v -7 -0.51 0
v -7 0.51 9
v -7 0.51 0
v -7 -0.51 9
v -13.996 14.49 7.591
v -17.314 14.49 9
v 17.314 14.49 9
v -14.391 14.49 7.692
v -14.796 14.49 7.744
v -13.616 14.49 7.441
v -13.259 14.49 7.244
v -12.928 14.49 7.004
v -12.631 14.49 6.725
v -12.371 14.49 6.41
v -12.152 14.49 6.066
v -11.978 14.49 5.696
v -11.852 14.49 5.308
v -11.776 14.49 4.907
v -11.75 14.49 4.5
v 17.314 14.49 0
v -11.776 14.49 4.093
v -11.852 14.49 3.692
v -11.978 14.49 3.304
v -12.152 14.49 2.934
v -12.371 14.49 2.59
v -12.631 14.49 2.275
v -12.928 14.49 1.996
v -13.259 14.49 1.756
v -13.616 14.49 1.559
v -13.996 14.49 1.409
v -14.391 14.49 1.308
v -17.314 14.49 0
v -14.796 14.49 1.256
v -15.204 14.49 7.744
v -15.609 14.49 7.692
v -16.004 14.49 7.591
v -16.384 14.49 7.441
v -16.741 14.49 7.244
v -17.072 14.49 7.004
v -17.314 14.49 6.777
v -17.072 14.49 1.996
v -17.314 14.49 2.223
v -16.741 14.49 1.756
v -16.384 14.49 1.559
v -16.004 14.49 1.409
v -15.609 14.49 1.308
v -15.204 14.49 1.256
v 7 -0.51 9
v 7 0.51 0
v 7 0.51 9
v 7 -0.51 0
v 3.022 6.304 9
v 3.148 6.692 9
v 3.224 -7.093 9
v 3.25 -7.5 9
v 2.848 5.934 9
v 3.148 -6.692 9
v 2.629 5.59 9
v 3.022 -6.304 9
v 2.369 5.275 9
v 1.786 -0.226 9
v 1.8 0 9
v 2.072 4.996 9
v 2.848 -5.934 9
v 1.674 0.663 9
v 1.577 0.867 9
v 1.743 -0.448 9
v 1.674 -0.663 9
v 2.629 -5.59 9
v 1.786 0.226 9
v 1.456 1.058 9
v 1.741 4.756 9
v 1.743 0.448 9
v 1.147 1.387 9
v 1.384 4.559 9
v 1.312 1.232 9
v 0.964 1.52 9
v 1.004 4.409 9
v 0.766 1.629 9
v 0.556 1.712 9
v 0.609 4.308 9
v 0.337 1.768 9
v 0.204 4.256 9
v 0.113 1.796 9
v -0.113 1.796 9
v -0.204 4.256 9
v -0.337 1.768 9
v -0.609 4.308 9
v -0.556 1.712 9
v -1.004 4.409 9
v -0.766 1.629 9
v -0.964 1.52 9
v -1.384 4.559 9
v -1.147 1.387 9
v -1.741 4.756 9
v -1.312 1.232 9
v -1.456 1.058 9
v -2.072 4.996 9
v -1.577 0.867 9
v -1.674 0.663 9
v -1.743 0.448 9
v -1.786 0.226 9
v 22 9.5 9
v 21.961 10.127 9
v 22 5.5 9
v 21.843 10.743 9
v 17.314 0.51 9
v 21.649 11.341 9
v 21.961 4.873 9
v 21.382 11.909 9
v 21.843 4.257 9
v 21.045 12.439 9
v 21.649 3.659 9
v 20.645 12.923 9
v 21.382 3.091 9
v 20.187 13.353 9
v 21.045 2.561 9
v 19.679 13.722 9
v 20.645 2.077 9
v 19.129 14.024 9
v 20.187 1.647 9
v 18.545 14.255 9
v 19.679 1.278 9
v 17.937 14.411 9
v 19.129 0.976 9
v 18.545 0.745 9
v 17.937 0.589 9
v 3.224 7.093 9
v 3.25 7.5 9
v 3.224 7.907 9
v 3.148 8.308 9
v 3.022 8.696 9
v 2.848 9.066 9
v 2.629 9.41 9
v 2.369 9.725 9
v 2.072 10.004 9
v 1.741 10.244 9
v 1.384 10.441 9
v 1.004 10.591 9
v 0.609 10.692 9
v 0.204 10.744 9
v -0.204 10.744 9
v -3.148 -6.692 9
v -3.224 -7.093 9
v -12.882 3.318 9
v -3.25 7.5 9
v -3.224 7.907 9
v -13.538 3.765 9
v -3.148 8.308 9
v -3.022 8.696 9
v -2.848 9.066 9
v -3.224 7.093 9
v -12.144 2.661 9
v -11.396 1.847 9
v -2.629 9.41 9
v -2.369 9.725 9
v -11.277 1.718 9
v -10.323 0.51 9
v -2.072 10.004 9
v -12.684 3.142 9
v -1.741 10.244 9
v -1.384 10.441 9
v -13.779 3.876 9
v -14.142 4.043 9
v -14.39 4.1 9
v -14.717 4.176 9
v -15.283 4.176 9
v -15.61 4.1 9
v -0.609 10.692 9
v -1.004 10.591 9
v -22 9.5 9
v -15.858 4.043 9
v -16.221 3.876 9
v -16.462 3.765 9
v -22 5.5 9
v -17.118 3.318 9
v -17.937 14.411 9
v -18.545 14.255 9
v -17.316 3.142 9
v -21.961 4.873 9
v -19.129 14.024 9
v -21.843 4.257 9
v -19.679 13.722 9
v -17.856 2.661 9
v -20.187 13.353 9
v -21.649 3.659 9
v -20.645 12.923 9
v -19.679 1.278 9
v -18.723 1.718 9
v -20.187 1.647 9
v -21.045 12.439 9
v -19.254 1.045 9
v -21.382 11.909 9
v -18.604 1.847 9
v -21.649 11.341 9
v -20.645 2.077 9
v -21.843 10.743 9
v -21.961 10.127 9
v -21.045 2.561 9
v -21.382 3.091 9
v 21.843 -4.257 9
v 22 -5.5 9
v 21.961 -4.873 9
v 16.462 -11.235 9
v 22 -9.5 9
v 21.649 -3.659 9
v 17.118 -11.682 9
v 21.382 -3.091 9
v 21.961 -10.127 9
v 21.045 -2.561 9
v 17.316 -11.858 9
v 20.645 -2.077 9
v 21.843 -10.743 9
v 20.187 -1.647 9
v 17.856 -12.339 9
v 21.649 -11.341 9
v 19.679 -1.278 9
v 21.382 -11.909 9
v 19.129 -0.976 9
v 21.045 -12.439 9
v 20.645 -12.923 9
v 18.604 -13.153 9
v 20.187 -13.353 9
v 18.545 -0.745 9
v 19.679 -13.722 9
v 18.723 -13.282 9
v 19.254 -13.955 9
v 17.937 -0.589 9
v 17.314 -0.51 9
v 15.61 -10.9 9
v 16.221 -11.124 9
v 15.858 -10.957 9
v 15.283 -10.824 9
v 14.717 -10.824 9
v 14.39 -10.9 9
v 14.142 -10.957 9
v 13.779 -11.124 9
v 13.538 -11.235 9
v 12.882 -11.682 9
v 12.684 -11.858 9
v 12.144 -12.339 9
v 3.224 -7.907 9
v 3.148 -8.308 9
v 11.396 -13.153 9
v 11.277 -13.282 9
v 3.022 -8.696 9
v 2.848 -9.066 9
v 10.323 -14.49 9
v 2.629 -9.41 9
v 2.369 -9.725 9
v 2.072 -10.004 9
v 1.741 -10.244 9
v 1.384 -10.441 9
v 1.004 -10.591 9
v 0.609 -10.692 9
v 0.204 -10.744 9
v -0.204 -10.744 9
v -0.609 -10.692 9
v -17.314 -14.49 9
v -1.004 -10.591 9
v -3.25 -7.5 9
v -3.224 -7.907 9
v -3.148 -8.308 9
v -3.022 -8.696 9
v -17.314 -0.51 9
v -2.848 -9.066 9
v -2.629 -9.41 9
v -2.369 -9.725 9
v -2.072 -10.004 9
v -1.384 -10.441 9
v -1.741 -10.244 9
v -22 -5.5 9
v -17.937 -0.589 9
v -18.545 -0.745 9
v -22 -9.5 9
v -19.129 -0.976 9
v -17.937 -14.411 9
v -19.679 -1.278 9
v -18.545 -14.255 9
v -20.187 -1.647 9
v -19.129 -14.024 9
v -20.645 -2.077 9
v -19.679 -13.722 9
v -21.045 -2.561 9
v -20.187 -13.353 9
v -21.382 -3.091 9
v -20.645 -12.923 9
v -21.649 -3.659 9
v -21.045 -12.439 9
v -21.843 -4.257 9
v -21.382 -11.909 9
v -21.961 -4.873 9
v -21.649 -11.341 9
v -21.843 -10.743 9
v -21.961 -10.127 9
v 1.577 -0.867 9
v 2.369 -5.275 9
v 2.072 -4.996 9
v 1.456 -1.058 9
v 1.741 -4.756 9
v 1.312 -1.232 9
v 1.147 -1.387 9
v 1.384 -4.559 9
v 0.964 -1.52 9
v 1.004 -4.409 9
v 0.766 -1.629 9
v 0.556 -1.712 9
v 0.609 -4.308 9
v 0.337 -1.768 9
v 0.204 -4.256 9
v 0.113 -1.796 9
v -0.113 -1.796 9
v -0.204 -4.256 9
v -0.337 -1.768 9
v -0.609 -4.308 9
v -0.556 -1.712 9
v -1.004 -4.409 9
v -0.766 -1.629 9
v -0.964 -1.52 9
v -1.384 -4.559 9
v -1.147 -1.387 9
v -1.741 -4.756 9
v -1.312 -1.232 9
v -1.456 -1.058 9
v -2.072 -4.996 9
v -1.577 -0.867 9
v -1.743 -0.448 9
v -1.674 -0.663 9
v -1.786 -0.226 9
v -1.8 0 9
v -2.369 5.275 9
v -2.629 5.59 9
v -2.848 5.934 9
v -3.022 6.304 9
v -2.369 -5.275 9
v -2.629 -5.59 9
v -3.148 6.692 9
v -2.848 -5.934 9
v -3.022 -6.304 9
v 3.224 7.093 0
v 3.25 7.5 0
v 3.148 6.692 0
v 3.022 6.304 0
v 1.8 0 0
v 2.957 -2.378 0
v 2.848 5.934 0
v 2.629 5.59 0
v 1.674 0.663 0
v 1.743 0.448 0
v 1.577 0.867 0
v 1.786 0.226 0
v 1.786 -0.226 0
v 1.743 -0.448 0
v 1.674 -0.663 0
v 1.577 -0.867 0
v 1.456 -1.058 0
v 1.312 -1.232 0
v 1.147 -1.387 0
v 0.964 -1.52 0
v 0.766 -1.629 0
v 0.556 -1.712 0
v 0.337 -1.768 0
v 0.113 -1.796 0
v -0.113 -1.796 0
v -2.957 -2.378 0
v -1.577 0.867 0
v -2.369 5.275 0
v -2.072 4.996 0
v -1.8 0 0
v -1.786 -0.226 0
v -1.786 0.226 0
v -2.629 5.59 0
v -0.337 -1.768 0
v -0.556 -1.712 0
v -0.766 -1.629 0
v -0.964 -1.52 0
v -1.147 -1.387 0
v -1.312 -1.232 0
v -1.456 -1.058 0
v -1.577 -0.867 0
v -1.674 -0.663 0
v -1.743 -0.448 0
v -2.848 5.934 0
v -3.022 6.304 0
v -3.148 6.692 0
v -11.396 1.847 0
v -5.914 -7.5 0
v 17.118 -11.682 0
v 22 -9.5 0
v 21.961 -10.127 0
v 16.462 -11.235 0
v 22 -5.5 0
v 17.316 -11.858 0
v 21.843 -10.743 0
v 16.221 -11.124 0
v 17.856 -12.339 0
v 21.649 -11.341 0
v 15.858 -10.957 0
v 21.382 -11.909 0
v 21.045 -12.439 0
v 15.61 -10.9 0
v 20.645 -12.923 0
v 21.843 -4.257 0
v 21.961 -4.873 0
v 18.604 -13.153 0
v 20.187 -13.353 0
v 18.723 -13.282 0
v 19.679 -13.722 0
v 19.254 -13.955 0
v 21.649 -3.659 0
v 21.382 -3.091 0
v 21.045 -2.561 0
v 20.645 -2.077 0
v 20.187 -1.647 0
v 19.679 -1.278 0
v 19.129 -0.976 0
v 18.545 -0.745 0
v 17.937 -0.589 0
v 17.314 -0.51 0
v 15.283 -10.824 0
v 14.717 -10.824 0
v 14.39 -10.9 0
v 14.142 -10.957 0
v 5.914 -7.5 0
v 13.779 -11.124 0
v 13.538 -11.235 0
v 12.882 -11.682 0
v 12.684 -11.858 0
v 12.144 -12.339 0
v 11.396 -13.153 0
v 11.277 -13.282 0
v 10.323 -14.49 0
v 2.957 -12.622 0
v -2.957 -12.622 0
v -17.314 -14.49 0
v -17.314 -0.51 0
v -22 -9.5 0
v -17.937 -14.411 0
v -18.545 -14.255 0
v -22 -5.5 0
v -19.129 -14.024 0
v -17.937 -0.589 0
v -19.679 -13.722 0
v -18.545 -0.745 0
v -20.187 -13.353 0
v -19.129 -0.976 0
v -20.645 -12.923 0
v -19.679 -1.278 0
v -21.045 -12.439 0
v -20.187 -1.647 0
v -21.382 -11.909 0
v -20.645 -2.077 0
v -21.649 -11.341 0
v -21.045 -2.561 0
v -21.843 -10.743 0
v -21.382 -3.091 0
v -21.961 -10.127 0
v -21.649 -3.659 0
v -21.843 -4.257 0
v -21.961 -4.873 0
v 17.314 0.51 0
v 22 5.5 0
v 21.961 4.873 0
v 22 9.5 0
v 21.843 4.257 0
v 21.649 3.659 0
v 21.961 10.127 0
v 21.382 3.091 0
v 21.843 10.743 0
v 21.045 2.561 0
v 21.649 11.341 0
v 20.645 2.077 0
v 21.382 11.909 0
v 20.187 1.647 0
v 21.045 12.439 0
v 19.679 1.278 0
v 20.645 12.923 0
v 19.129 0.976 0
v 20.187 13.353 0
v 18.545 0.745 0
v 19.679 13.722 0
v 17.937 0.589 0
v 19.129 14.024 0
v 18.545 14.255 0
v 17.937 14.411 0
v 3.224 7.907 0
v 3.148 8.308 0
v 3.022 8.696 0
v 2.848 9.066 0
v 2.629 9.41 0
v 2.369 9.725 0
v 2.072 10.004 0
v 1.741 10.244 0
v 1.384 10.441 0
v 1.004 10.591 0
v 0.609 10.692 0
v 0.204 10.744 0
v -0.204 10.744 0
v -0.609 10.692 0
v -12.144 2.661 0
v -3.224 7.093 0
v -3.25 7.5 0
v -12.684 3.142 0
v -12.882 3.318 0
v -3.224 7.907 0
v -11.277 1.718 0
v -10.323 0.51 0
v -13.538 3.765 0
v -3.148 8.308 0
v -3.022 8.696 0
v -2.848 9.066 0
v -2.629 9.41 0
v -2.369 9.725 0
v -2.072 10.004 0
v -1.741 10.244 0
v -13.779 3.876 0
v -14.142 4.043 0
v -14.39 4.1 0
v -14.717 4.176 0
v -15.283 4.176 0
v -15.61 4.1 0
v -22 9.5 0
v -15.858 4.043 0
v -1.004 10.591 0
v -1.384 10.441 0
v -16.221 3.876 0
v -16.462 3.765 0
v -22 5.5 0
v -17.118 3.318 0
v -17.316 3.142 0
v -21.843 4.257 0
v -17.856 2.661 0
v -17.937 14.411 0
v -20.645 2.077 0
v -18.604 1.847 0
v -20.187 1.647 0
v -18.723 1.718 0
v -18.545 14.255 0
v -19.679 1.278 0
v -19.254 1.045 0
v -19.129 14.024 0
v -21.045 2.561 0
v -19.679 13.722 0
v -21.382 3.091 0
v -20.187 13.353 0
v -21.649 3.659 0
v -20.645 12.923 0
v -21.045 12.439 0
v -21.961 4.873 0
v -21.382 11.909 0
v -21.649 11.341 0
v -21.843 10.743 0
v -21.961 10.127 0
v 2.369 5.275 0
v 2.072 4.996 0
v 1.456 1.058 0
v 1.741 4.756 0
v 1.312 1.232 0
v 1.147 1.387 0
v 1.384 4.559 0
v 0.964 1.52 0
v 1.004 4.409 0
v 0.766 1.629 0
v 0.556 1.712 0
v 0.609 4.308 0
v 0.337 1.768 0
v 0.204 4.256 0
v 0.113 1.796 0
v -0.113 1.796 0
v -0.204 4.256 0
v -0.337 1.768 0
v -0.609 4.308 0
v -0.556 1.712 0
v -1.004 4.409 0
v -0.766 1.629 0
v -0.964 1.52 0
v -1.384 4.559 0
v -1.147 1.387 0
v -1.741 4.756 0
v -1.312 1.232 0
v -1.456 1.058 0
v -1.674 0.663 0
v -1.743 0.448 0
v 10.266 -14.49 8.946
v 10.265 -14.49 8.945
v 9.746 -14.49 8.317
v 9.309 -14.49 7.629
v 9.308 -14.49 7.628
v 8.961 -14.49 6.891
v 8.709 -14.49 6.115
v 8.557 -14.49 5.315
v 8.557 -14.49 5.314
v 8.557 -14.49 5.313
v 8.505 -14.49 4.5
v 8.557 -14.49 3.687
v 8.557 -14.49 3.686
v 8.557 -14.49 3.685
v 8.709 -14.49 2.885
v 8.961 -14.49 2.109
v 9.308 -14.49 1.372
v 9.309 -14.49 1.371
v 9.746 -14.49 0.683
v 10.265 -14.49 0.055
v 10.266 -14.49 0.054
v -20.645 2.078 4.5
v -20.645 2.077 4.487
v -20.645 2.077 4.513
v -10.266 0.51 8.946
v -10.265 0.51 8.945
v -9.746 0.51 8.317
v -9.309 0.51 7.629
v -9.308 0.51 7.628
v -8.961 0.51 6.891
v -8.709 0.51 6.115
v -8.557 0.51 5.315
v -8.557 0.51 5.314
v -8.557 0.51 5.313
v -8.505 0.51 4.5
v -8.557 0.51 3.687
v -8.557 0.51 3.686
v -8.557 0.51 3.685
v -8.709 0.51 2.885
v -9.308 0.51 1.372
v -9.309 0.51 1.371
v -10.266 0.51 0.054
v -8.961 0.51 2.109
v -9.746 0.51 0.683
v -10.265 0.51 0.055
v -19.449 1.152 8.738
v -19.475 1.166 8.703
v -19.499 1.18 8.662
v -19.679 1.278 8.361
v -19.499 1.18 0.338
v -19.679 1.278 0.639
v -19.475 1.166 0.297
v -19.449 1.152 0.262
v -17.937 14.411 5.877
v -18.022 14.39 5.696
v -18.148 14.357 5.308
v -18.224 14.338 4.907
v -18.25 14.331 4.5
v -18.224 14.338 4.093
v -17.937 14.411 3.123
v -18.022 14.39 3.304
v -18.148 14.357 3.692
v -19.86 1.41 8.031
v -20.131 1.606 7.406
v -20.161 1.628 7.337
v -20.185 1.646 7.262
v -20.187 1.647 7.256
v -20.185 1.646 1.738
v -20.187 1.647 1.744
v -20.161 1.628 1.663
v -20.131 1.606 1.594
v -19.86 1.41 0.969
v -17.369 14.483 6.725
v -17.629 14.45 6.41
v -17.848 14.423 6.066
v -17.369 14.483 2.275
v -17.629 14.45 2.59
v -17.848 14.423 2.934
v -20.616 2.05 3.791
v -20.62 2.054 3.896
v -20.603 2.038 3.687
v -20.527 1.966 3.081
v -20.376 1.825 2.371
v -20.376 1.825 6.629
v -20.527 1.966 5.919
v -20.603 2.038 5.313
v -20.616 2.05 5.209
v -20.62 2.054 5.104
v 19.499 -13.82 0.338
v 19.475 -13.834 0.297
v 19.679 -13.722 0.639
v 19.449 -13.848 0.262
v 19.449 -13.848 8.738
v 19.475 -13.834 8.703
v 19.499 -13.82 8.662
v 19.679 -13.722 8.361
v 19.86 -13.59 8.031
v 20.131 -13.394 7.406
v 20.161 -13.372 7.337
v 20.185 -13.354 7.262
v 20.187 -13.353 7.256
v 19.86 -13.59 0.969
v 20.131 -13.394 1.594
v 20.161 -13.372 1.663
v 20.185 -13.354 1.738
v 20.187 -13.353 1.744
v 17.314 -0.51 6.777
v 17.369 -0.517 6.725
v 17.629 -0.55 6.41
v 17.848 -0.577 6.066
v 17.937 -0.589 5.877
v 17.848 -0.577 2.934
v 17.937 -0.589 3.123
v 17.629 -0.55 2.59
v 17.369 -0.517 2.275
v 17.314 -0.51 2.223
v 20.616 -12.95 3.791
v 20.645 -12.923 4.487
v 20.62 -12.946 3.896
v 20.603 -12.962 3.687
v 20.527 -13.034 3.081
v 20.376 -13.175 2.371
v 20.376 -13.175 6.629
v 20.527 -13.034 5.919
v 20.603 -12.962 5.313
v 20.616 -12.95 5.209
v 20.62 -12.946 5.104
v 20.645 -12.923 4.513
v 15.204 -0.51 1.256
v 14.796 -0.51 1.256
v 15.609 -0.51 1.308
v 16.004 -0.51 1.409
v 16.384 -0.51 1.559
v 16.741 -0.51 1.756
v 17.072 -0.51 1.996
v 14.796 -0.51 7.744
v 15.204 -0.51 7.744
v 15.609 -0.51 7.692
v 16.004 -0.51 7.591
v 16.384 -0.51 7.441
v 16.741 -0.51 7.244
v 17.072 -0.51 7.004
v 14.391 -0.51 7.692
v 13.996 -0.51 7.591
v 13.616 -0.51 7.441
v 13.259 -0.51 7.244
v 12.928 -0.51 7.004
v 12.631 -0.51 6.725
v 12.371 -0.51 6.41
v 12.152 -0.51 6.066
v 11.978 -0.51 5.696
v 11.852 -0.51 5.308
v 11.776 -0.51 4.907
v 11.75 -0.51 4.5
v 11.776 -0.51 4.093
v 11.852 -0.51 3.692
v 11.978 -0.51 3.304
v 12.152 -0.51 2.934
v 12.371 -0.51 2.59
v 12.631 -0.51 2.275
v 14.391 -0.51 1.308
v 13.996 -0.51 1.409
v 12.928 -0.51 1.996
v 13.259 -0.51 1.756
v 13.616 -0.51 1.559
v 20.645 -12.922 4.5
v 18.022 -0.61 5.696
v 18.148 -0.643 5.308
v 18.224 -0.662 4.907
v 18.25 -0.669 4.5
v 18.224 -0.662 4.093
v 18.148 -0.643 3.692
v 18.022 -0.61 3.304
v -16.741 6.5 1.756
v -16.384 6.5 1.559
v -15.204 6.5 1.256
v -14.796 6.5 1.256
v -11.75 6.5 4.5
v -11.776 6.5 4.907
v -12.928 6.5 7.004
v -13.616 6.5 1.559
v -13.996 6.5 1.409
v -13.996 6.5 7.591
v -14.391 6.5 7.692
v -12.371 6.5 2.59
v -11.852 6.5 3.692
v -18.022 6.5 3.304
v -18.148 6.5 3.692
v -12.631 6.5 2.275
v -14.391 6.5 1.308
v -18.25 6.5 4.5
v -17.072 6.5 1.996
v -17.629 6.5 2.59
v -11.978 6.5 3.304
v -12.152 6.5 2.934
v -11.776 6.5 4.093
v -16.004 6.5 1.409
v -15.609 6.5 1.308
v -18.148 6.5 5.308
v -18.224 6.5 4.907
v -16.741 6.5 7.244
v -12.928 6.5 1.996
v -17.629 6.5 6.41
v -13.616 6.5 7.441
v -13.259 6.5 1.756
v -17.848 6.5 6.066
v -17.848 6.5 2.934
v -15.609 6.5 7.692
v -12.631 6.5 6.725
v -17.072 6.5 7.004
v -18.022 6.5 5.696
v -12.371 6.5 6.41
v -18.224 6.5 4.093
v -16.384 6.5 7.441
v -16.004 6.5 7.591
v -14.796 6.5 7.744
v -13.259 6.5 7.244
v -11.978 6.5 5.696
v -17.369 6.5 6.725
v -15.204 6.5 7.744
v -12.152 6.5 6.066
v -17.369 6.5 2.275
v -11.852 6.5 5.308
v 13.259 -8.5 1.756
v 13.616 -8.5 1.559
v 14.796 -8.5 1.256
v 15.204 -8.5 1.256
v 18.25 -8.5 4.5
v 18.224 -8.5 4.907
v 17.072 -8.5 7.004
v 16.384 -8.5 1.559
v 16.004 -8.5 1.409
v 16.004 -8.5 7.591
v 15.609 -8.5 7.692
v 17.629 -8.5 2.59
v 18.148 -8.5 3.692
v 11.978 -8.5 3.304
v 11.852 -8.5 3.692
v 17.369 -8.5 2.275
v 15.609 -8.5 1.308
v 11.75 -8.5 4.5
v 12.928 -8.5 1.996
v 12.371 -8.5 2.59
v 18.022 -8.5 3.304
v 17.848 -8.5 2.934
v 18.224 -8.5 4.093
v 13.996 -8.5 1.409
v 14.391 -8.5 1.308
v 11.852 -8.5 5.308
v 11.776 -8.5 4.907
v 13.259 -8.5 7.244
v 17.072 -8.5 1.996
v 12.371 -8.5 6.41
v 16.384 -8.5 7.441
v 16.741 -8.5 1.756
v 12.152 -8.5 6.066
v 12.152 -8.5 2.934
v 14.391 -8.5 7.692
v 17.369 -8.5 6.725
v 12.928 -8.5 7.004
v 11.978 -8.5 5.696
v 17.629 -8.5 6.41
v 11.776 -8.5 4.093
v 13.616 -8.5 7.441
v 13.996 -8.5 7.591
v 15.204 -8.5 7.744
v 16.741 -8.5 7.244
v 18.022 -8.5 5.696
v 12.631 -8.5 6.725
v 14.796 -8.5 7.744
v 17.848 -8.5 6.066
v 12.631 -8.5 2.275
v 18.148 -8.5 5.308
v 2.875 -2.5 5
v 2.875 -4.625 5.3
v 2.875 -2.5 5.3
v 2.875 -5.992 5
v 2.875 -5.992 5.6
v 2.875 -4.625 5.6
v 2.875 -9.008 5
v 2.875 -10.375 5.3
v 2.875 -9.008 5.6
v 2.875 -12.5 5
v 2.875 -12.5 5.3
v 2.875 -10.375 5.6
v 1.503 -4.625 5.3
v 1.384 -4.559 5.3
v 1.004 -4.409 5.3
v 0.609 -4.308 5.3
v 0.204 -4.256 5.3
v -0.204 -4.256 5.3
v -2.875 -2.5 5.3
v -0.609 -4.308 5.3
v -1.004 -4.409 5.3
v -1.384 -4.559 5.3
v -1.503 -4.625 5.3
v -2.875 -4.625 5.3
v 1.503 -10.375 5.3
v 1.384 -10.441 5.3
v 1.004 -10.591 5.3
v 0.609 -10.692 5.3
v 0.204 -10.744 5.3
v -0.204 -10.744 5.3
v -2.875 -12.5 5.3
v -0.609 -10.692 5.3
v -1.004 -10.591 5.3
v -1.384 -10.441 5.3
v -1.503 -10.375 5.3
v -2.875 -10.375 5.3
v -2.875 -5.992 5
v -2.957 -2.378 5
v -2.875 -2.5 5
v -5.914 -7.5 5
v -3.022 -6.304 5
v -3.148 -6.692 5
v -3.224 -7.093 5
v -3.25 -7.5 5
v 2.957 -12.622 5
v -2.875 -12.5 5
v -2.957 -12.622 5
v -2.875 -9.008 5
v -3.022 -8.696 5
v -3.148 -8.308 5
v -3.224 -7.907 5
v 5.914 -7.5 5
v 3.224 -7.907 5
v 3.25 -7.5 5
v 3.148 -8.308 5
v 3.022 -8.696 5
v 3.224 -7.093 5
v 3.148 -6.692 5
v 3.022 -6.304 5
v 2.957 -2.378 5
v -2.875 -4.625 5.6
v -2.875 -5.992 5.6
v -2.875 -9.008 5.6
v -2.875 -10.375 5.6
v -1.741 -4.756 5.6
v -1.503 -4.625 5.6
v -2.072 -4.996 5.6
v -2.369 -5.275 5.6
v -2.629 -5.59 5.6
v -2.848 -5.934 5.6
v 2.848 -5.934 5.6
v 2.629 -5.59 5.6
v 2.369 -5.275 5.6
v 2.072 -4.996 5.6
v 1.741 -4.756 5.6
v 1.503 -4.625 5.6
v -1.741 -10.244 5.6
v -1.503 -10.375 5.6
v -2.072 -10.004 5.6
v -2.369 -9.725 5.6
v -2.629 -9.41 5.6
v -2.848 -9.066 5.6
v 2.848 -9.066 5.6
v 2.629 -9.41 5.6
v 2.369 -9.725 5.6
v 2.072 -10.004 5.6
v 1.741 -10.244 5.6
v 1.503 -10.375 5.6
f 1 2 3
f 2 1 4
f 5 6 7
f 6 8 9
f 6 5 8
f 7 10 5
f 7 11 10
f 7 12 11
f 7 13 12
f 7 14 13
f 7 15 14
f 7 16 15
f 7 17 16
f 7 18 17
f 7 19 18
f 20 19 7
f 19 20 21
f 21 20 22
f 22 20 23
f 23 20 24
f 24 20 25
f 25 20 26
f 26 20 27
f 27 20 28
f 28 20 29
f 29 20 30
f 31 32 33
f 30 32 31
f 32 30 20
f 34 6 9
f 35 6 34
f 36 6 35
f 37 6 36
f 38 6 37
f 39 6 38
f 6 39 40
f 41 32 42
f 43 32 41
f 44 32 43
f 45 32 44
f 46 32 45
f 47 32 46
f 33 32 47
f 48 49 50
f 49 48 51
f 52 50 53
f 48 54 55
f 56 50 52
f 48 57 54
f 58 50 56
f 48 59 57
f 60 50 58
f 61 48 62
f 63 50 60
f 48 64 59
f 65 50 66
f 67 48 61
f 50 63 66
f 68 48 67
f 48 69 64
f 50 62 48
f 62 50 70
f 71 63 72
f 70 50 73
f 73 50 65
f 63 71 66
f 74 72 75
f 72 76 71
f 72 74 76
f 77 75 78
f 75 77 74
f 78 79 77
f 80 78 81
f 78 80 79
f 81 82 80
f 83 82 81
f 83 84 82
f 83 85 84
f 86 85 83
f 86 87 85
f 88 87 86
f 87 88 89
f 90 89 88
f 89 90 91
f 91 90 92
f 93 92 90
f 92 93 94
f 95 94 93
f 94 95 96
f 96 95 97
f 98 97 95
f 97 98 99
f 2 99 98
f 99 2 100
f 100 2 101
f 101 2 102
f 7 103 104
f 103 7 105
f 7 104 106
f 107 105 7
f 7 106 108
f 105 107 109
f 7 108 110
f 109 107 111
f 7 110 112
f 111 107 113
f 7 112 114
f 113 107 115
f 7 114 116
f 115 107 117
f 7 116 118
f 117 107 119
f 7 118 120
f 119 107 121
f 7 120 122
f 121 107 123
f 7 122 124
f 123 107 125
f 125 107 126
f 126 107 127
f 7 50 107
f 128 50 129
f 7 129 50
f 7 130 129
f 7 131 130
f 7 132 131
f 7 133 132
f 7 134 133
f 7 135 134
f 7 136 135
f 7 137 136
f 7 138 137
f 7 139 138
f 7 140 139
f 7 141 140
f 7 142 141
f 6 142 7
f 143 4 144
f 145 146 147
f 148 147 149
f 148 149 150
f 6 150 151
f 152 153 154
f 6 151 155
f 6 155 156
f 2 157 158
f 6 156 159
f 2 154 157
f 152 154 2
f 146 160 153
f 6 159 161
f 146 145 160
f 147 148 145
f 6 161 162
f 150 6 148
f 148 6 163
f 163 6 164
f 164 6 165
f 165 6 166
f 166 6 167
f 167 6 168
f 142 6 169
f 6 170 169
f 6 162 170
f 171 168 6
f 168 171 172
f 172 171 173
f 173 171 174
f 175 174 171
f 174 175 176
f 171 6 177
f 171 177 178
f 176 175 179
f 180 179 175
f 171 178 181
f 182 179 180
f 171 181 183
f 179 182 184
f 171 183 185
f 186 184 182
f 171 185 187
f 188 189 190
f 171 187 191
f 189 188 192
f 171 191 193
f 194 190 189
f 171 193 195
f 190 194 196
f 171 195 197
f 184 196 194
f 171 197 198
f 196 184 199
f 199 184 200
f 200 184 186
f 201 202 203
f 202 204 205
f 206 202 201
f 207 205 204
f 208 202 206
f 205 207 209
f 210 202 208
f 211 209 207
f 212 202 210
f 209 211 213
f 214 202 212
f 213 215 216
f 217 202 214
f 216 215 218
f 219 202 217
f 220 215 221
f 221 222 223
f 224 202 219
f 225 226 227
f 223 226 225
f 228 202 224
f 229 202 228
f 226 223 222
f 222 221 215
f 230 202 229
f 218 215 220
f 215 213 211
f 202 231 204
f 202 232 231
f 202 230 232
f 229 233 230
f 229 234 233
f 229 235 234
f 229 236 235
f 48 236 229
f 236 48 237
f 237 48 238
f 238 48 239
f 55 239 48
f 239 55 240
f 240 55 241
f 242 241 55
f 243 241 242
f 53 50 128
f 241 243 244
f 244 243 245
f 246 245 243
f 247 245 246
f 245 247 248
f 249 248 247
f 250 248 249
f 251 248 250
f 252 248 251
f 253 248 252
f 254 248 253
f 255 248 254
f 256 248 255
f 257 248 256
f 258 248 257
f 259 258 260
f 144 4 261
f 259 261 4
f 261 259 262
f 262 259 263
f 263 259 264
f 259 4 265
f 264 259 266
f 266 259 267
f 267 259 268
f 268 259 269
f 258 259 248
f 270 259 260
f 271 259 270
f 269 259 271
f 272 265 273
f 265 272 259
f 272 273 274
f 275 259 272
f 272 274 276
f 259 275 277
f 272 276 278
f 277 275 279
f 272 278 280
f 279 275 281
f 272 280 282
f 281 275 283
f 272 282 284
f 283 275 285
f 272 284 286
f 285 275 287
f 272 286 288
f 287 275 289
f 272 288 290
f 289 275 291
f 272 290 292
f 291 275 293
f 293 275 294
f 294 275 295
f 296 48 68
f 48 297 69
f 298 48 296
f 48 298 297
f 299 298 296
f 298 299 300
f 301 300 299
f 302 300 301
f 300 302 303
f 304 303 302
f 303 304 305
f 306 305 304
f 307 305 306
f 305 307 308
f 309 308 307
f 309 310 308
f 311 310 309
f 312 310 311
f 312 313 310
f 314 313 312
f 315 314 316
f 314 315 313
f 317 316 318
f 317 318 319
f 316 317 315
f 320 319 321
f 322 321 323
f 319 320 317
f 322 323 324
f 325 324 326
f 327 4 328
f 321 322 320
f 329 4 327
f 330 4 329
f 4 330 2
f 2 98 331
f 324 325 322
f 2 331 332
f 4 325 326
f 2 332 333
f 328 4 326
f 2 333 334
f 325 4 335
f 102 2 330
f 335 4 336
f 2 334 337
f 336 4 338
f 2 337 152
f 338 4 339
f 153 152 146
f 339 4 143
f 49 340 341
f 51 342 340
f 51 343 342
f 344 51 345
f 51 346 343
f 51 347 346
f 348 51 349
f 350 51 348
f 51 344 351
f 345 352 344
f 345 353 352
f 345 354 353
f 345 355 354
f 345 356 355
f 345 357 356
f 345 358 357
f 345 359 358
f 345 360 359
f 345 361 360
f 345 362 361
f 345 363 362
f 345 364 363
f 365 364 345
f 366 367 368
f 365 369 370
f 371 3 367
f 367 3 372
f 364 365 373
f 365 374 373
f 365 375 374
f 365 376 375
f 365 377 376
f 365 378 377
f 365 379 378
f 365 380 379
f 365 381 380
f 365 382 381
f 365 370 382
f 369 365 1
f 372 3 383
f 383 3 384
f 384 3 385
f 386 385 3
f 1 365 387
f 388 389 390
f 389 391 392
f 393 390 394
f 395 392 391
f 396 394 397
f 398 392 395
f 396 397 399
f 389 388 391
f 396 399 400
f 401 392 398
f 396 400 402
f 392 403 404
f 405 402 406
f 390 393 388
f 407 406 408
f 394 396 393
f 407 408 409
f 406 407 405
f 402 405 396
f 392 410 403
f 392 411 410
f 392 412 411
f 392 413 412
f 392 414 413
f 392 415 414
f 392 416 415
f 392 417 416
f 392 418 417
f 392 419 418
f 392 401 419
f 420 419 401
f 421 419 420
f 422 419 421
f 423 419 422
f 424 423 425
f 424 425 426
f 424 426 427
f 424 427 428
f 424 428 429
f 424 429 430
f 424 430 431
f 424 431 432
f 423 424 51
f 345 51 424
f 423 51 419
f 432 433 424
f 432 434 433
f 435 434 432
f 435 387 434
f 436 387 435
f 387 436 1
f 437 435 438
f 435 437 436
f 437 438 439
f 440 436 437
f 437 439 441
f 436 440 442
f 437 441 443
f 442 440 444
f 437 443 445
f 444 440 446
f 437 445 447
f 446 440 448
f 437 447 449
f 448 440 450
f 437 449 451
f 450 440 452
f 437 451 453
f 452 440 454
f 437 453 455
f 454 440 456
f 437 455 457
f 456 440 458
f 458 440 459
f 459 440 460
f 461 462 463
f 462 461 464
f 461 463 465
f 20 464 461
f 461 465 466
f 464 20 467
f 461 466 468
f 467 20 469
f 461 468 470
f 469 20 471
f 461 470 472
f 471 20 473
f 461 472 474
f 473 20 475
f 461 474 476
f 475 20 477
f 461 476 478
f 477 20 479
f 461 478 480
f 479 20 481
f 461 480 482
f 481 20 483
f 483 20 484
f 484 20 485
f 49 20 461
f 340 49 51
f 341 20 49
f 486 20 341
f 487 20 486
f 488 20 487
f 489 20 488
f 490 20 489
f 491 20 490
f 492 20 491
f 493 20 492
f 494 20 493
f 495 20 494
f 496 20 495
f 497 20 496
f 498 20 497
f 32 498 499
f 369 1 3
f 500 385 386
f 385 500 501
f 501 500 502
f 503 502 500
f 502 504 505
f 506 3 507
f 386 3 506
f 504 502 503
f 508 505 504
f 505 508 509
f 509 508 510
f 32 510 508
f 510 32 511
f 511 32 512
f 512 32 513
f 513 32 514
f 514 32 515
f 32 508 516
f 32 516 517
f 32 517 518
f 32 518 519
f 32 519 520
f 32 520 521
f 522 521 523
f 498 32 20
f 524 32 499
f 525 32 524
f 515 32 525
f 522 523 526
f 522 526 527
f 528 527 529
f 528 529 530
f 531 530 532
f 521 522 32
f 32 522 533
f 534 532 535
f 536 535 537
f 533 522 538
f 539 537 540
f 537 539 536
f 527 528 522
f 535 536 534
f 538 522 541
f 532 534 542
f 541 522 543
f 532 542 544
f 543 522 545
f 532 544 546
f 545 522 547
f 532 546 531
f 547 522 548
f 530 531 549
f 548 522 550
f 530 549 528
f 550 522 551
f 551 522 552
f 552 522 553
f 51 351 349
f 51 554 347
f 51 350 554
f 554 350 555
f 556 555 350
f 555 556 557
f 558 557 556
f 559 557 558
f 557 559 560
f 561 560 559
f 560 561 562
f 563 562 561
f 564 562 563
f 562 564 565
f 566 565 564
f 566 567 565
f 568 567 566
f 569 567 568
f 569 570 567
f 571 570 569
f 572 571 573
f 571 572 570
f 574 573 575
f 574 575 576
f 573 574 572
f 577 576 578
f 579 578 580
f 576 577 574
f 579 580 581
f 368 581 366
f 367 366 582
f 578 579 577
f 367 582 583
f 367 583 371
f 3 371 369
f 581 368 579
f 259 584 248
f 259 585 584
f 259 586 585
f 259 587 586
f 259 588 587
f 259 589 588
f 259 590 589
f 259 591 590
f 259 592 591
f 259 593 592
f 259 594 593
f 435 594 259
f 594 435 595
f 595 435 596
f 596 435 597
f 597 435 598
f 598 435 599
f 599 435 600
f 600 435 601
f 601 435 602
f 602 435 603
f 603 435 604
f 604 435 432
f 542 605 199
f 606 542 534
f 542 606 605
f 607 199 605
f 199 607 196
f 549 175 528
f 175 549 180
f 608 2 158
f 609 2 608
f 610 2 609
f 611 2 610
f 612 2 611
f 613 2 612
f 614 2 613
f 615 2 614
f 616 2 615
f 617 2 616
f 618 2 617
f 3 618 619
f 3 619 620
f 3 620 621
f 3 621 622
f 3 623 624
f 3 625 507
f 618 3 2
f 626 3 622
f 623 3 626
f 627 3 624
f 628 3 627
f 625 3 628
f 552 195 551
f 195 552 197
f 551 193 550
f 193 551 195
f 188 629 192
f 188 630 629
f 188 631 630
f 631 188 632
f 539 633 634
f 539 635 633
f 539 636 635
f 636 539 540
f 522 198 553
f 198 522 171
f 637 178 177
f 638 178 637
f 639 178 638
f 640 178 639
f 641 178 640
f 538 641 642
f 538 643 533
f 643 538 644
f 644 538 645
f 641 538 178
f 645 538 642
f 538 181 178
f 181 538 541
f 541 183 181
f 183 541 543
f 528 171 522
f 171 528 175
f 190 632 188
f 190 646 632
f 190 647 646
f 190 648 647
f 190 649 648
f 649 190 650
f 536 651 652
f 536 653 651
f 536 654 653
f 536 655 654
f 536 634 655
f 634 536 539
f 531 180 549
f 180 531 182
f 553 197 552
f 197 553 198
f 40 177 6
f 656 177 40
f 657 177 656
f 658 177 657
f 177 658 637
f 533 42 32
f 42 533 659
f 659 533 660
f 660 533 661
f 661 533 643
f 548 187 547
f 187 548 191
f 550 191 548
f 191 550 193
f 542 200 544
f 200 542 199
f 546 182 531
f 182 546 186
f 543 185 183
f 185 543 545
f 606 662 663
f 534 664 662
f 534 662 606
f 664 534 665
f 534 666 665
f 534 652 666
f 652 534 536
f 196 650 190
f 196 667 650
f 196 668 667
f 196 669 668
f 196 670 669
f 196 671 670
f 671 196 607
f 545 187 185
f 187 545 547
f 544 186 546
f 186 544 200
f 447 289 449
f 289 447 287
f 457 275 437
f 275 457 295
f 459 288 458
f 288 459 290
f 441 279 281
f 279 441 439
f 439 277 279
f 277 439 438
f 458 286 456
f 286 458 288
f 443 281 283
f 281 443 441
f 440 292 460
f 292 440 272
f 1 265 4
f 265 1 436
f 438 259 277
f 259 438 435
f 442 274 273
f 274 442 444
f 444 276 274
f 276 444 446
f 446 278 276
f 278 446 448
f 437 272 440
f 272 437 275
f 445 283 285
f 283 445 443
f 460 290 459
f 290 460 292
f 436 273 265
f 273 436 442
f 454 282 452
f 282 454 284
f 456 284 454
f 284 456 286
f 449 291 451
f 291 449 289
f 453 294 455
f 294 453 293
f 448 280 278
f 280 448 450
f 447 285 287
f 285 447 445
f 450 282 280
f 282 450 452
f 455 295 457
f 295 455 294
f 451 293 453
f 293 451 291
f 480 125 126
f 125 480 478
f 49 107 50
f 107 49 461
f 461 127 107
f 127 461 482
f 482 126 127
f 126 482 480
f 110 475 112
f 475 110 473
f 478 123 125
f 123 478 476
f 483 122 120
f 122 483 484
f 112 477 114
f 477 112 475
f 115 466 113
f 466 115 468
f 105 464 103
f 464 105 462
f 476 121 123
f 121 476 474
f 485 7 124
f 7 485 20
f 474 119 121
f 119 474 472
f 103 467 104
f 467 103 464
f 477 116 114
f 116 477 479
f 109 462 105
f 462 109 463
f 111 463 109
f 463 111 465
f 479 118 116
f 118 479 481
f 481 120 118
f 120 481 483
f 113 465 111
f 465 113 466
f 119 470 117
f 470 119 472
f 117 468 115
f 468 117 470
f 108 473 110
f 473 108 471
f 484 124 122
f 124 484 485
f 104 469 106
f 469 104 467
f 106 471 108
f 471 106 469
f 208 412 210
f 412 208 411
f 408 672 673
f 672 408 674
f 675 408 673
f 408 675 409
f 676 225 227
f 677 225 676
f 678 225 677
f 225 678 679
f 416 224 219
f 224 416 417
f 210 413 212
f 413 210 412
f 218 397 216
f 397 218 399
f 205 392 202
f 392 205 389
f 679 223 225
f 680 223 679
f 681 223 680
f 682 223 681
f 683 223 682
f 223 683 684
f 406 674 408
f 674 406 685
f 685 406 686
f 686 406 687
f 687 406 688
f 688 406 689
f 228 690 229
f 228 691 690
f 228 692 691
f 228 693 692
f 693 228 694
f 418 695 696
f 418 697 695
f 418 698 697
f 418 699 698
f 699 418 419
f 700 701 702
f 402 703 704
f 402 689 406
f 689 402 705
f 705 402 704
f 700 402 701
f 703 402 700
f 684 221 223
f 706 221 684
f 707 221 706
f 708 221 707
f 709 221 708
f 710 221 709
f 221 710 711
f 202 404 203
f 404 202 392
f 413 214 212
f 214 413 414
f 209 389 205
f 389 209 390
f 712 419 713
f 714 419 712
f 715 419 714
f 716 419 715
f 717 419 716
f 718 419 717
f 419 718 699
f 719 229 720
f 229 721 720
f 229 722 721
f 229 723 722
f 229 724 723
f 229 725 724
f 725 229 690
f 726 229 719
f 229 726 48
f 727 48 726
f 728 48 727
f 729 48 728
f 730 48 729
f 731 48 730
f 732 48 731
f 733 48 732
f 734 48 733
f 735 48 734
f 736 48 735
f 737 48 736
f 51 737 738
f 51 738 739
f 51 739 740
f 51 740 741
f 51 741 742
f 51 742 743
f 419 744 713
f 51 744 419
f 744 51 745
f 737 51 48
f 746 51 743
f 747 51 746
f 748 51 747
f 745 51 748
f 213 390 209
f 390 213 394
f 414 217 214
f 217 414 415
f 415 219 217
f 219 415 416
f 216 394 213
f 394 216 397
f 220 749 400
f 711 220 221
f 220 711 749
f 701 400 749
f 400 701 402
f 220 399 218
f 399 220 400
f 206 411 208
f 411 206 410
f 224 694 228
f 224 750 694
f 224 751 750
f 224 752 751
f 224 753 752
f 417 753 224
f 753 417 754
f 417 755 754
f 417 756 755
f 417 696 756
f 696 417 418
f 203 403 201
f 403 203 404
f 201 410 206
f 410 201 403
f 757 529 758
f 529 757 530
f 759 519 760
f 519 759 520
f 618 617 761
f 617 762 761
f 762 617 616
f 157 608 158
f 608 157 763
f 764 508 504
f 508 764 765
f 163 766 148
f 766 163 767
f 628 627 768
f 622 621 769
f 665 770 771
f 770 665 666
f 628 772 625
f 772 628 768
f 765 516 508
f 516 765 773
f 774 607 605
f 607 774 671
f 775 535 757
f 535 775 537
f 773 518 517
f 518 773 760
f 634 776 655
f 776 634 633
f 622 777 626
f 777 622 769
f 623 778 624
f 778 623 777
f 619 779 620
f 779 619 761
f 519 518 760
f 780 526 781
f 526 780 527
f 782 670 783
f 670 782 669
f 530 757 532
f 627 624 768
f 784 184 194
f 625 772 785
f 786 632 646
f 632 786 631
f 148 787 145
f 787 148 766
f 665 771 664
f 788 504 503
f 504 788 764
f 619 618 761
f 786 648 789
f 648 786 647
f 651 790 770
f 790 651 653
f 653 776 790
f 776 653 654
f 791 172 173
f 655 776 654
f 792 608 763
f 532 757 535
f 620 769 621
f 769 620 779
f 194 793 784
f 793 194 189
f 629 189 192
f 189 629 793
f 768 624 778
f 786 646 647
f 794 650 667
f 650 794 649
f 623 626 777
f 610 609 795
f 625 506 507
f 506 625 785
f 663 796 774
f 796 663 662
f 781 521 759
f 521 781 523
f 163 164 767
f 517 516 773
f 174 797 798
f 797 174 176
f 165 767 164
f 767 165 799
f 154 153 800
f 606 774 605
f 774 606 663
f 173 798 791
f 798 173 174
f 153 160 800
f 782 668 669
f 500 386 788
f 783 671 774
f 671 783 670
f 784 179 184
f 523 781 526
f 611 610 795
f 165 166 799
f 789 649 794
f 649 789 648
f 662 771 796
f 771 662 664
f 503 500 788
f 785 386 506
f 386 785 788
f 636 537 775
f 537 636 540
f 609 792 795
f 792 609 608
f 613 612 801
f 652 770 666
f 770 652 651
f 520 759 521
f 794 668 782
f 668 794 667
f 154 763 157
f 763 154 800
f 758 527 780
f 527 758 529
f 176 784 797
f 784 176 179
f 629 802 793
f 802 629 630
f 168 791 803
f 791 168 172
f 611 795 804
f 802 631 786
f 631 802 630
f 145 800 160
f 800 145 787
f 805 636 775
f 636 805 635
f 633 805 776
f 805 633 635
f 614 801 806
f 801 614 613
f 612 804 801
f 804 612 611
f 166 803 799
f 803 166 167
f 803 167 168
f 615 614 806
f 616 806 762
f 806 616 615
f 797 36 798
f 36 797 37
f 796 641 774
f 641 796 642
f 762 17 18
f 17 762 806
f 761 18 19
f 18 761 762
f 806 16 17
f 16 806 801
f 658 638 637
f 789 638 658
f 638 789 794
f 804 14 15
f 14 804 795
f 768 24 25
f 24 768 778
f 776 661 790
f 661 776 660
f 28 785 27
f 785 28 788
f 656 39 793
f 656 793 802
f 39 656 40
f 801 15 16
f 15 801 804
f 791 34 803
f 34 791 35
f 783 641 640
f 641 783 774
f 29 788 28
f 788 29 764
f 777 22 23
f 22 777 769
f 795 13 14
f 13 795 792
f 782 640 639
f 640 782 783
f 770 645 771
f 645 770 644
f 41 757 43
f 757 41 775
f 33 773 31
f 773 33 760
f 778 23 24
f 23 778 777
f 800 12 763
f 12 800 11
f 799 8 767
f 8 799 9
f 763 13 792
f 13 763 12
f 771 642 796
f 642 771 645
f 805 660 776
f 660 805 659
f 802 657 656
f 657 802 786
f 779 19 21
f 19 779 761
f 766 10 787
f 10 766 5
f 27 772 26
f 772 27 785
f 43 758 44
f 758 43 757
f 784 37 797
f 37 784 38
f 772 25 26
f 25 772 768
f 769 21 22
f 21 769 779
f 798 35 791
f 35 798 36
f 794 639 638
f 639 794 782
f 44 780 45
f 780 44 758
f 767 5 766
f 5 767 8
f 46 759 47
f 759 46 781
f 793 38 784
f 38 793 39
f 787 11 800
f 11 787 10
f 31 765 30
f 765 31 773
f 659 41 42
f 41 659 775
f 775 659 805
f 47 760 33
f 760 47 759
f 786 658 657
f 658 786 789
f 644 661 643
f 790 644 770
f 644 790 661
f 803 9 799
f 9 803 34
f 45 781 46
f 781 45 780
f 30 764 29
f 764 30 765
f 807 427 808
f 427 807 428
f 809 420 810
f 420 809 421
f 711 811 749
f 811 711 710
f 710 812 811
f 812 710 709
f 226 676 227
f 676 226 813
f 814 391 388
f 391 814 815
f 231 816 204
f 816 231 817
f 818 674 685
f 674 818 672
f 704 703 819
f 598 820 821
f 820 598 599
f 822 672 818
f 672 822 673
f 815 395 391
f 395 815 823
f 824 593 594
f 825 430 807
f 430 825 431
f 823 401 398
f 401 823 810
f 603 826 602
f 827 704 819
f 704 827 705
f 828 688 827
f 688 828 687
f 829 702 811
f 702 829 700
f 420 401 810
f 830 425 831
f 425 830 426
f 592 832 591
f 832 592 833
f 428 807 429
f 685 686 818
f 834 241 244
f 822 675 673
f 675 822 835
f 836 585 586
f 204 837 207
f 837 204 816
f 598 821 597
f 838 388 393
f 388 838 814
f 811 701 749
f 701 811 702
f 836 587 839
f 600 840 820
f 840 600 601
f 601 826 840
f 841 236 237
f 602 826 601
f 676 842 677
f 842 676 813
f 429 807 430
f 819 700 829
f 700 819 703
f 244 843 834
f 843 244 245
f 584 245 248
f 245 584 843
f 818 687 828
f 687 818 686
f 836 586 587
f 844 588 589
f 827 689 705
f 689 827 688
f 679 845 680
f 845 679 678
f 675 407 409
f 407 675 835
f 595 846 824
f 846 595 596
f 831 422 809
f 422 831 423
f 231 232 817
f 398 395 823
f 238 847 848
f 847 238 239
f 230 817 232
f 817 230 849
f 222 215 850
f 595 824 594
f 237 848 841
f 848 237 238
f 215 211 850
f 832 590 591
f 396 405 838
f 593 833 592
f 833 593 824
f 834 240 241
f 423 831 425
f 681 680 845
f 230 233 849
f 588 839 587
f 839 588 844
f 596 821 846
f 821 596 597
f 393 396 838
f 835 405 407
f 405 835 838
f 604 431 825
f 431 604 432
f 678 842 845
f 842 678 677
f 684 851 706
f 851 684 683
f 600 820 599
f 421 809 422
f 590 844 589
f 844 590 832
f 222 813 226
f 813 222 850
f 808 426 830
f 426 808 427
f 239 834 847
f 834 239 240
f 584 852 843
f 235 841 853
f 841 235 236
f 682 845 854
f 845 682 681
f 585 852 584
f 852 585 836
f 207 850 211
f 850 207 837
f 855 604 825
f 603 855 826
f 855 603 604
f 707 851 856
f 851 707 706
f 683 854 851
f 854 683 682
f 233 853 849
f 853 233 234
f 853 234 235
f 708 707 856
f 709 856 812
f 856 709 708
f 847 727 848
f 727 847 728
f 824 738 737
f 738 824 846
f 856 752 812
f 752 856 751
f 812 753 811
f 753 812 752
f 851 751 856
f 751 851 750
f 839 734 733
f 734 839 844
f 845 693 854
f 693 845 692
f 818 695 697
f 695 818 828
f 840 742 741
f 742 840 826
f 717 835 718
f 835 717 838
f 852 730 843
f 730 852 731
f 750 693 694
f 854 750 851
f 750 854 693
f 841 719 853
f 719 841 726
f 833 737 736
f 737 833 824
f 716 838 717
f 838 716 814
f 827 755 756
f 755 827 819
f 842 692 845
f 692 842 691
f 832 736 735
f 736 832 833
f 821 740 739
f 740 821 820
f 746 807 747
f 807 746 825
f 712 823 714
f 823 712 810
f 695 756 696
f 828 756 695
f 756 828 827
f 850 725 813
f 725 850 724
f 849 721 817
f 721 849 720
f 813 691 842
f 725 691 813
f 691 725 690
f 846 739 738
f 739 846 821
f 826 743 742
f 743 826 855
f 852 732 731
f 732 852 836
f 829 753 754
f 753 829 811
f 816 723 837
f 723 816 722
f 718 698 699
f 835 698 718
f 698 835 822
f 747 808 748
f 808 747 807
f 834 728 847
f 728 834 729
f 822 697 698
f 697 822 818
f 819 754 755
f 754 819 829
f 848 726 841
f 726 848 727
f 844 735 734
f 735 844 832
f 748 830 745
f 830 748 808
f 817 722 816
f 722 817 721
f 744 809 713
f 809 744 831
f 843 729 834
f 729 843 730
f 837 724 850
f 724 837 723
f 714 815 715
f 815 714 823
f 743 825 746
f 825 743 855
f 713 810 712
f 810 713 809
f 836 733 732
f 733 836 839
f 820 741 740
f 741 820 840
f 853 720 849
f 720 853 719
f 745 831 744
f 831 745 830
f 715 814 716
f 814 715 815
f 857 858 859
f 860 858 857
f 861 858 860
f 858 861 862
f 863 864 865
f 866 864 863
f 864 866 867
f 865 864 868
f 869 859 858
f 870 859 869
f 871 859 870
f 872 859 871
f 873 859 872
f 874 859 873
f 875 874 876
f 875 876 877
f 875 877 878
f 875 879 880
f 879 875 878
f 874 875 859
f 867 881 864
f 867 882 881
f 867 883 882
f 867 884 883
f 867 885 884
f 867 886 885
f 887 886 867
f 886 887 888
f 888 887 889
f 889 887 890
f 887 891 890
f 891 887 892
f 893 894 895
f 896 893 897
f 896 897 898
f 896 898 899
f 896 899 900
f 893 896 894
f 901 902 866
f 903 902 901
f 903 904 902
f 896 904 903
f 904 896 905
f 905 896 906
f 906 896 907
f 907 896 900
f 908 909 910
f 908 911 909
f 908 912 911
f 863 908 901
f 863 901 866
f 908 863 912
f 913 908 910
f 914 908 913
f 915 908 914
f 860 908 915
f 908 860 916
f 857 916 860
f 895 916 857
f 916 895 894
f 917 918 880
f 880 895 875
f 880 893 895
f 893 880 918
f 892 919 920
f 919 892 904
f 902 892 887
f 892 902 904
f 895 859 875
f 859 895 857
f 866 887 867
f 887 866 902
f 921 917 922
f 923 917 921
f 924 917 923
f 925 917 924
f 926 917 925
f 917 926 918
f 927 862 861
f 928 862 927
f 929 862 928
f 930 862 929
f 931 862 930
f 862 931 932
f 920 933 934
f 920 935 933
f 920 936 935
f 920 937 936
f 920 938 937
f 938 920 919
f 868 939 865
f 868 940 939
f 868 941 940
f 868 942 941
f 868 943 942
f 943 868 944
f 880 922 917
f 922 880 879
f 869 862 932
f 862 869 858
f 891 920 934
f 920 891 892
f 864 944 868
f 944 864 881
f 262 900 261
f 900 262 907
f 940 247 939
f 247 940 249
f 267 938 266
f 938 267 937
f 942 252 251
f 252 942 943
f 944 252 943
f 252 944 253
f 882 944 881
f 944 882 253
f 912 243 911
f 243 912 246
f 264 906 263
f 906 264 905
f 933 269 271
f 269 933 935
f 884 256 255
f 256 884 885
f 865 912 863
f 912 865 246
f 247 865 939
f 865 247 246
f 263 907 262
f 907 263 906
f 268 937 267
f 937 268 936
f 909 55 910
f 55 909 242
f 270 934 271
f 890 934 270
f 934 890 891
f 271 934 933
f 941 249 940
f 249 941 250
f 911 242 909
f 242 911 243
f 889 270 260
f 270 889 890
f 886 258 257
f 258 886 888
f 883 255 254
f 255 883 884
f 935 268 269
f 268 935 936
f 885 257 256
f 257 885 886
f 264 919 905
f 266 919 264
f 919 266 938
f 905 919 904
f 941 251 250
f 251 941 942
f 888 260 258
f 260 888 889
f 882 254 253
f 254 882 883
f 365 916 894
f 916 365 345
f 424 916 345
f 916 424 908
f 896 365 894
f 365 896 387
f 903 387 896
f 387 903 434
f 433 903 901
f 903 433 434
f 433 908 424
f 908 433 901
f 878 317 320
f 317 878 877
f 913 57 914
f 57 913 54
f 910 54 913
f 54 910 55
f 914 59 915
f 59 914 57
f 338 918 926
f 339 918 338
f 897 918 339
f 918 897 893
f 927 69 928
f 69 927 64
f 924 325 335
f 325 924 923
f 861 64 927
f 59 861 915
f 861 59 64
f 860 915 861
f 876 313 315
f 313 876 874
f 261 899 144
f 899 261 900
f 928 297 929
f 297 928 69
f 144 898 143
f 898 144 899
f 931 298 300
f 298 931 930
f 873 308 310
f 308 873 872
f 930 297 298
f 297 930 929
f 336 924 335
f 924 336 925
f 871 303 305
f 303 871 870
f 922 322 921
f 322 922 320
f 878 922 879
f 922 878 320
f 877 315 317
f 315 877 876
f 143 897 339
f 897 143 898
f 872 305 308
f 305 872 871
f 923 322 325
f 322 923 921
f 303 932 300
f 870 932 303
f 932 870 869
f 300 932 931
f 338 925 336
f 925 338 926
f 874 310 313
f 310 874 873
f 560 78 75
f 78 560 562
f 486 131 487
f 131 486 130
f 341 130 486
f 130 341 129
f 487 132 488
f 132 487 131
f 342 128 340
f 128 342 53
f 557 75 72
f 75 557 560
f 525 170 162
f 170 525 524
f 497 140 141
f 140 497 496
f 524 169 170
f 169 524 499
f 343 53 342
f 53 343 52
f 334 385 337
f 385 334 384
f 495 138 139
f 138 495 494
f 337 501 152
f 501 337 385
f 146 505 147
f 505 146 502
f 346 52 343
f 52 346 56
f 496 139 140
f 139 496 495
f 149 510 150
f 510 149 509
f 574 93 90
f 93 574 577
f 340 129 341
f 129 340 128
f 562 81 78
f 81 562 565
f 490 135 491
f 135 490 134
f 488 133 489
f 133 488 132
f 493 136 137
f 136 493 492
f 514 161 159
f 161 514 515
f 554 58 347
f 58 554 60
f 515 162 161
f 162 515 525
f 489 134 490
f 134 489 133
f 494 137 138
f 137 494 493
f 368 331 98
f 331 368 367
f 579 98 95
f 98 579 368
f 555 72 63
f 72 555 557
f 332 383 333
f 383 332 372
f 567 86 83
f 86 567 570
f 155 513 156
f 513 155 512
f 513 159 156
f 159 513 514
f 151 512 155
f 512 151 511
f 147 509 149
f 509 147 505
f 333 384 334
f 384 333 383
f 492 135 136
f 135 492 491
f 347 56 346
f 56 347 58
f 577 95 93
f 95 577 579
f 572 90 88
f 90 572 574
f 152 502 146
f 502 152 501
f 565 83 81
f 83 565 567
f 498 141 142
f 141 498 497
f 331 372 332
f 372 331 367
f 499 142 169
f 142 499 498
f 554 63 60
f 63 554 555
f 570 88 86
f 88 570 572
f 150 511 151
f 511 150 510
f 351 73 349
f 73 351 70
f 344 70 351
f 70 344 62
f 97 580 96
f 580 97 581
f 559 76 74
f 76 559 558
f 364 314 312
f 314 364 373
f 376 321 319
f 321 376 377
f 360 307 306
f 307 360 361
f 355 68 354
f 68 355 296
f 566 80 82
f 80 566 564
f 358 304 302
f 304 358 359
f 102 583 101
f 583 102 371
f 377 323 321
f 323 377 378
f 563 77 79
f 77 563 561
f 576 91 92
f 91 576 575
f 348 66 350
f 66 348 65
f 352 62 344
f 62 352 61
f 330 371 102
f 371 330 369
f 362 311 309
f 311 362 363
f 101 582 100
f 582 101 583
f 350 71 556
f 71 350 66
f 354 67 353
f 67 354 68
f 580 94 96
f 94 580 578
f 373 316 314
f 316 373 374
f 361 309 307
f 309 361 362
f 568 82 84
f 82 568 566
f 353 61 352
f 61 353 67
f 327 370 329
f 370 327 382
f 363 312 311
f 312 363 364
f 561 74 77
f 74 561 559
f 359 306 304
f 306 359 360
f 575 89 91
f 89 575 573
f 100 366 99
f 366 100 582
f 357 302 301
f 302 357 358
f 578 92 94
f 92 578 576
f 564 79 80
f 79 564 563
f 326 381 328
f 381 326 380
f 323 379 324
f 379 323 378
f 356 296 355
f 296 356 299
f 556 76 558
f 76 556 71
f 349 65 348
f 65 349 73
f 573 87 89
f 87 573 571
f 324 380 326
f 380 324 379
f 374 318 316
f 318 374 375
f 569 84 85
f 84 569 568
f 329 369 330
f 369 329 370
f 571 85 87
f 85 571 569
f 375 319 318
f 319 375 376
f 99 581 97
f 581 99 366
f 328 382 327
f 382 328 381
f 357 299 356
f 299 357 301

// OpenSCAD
$fn = 50;


difference() {
	union() {
		hull() {
			translate(v = [-2.0000000000, 9.5000000000, 0]) {
				cylinder(h = 9, r = 5);
			}
			translate(v = [2.0000000000, 9.5000000000, 0]) {
				cylinder(h = 9, r = 5);
			}
			translate(v = [-2.0000000000, -9.5000000000, 0]) {
				cylinder(h = 9, r = 5);
			}
			translate(v = [2.0000000000, -9.5000000000, 0]) {
				cylinder(h = 9, r = 5);
			}
		}
		translate(v = [-7.5000000000, 7.5000000000, 0]) {
			hull() {
				translate(v = [-9.5000000000, 2.0000000000, 0]) {
					cylinder(h = 9, r = 5);
				}
				translate(v = [9.5000000000, 2.0000000000, 0]) {
					cylinder(h = 9, r = 5);
				}
				translate(v = [-9.5000000000, -2.0000000000, 0]) {
					cylinder(h = 9, r = 5);
				}
				translate(v = [9.5000000000, -2.0000000000, 0]) {
					cylinder(h = 9, r = 5);
				}
			}
		}
		translate(v = [-7.5000000000, -7.5000000000, 0]) {
			hull() {
				translate(v = [-9.5000000000, 2.0000000000, 0]) {
					cylinder(h = 9, r = 5);
				}
				translate(v = [9.5000000000, 2.0000000000, 0]) {
					cylinder(h = 9, r = 5);
				}
				translate(v = [-9.5000000000, -2.0000000000, 0]) {
					cylinder(h = 9, r = 5);
				}
				translate(v = [9.5000000000, -2.0000000000, 0]) {
					cylinder(h = 9, r = 5);
				}
			}
		}
		translate(v = [7.5000000000, 7.5000000000, 0]) {
			hull() {
				translate(v = [-9.5000000000, 2.0000000000, 0]) {
					cylinder(h = 9, r = 5);
				}
				translate(v = [9.5000000000, 2.0000000000, 0]) {
					cylinder(h = 9, r = 5);
				}
				translate(v = [-9.5000000000, -2.0000000000, 0]) {
					cylinder(h = 9, r = 5);
				}
				translate(v = [9.5000000000, -2.0000000000, 0]) {
					cylinder(h = 9, r = 5);
				}
			}
		}
		translate(v = [7.5000000000, -7.5000000000, 0]) {
			hull() {
				translate(v = [-9.5000000000, 2.0000000000, 0]) {
					cylinder(h = 9, r = 5);
				}
				translate(v = [9.5000000000, 2.0000000000, 0]) {
					cylinder(h = 9, r = 5);
				}
				translate(v = [-9.5000000000, -2.0000000000, 0]) {
					cylinder(h = 9, r = 5);
				}
				translate(v = [9.5000000000, -2.0000000000, 0]) {
					cylinder(h = 9, r = 5);
				}
			}
		}
	}
	union() {
		translate(v = [-15.0000000000, 0.5000000000, 4.5000000000]) {
			rotate(a = [90, 0, 0]) {
				difference() {
					union() {
						#translate(v = [0, 0, -14.0000000000]) {
							cylinder(h = 14, r = 2.2500000000);
						}
						#translate(v = [0, 0, -6]) {
							cylinder(h = 6, r1 = 3.2500000000, r2 = 6.5000000000);
						}
						#translate(v = [0, 0, -14.0000000000]) {
							cylinder(h = 14, r = 3.2500000000);
						}
						#translate(v = [0, 0, -14.0000000000]) {
							cylinder(h = 14, r = 2.2500000000);
						}
					}
					union();
				}
			}
		}
		translate(v = [15.0000000000, -14.5000000000, 4.5000000000]) {
			rotate(a = [90, 0, 0]) {
				difference() {
					union() {
						#translate(v = [0, 0, -14.0000000000]) {
							cylinder(h = 14, r = 2.2500000000);
						}
						#translate(v = [0, 0, -6]) {
							cylinder(h = 6, r1 = 3.2500000000, r2 = 6.5000000000);
						}
						#translate(v = [0, 0, -14.0000000000]) {
							cylinder(h = 14, r = 3.2500000000);
						}
						#translate(v = [0, 0, -14.0000000000]) {
							cylinder(h = 14, r = 2.2500000000);
						}
					}
					union();
				}
			}
		}
		translate(v = [0.0000000000, -7.5000000000, 0]) {
			rotate(a = [0, 0, 0]) {
				difference() {
					union() {
						#translate(v = [-2.8750000000, -5.0000000000, -0.3000000000]) {
							cube(size = [5.7500000000, 10, 0.3000000000]);
						}
						#translate(v = [-2.8750000000, -2.8750000000, -0.6000000000]) {
							cube(size = [5.7500000000, 5.7500000000, 0.3000000000]);
						}
						#translate(v = [-2.8750000000, -5.0000000000, 5]) {
							cube(size = [5.7500000000, 10, 0.3000000000]);
						}
						#translate(v = [-2.8750000000, -2.8750000000, 5.3000000000]) {
							cube(size = [5.7500000000, 5.7500000000, 0.3000000000]);
						}
						#translate(v = [0, 0, -100.0000000000]) {
							cylinder(h = 200, r = 3.2500000000);
						}
						#linear_extrude(height = 5) {
							polygon(points = [[5.9142500000, 0.0000000000], [2.9571250000, 5.1218907443], [-2.9571250000, 5.1218907443], [-5.9142500000, 0.0000000000], [-2.9571250000, -5.1218907443], [2.9571250000, -5.1218907443]]);
						}
						#translate(v = [-2.8750000000, -5.0000000000, -0.3000000000]) {
							cube(size = [5.7500000000, 10, 0.3000000000]);
						}
						#translate(v = [-2.8750000000, -2.8750000000, -0.6000000000]) {
							cube(size = [5.7500000000, 5.7500000000, 0.3000000000]);
						}
						#translate(v = [-2.8750000000, -5.0000000000, 5]) {
							cube(size = [5.7500000000, 10, 0.3000000000]);
						}
						#translate(v = [-2.8750000000, -2.8750000000, 5.3000000000]) {
							cube(size = [5.7500000000, 5.7500000000, 0.3000000000]);
						}
						#translate(v = [0, 0, -100.0000000000]) {
							cylinder(h = 200, r = 3.2500000000);
						}
						#translate(v = [-2.8750000000, -5.0000000000, -0.3000000000]) {
							cube(size = [5.7500000000, 10, 0.3000000000]);
						}
						#translate(v = [-2.8750000000, -2.8750000000, -0.6000000000]) {
							cube(size = [5.7500000000, 5.7500000000, 0.3000000000]);
						}
						#translate(v = [-2.8750000000, -5.0000000000, 5]) {
							cube(size = [5.7500000000, 10, 0.3000000000]);
						}
						#translate(v = [-2.8750000000, -2.8750000000, 5.3000000000]) {
							cube(size = [5.7500000000, 5.7500000000, 0.3000000000]);
						}
						#translate(v = [0, 0, -100.0000000000]) {
							cylinder(h = 200, r = 3.2500000000);
						}
					}
					union();
				}
			}
		}
		translate(v = [0.0000000000, -7.5000000000, 0]) {
			translate(v = [0, 0, -100]) {
				cylinder(h = 200, r = 3.2500000000);
			}
		}
		translate(v = [0.0000000000, 7.5000000000, 0]) {
			translate(v = [0, 0, -100]) {
				cylinder(h = 200, r = 3.2500000000);
			}
		}
		translate(v = [0.0000000000, -7.5000000000, 0]) {
			translate(v = [0, 0, -100]) {
				cylinder(h = 200, r = 1.8000000000);
			}
		}
		translate(v = [0, 0, -100]) {
			cylinder(h = 200, r = 1.8000000000);
		}
		translate(v = [0.0000000000, 7.5000000000, 0]) {
			translate(v = [0, 0, -100]) {
				cylinder(h = 200, r = 1.8000000000);
			}
		}
	}
}
